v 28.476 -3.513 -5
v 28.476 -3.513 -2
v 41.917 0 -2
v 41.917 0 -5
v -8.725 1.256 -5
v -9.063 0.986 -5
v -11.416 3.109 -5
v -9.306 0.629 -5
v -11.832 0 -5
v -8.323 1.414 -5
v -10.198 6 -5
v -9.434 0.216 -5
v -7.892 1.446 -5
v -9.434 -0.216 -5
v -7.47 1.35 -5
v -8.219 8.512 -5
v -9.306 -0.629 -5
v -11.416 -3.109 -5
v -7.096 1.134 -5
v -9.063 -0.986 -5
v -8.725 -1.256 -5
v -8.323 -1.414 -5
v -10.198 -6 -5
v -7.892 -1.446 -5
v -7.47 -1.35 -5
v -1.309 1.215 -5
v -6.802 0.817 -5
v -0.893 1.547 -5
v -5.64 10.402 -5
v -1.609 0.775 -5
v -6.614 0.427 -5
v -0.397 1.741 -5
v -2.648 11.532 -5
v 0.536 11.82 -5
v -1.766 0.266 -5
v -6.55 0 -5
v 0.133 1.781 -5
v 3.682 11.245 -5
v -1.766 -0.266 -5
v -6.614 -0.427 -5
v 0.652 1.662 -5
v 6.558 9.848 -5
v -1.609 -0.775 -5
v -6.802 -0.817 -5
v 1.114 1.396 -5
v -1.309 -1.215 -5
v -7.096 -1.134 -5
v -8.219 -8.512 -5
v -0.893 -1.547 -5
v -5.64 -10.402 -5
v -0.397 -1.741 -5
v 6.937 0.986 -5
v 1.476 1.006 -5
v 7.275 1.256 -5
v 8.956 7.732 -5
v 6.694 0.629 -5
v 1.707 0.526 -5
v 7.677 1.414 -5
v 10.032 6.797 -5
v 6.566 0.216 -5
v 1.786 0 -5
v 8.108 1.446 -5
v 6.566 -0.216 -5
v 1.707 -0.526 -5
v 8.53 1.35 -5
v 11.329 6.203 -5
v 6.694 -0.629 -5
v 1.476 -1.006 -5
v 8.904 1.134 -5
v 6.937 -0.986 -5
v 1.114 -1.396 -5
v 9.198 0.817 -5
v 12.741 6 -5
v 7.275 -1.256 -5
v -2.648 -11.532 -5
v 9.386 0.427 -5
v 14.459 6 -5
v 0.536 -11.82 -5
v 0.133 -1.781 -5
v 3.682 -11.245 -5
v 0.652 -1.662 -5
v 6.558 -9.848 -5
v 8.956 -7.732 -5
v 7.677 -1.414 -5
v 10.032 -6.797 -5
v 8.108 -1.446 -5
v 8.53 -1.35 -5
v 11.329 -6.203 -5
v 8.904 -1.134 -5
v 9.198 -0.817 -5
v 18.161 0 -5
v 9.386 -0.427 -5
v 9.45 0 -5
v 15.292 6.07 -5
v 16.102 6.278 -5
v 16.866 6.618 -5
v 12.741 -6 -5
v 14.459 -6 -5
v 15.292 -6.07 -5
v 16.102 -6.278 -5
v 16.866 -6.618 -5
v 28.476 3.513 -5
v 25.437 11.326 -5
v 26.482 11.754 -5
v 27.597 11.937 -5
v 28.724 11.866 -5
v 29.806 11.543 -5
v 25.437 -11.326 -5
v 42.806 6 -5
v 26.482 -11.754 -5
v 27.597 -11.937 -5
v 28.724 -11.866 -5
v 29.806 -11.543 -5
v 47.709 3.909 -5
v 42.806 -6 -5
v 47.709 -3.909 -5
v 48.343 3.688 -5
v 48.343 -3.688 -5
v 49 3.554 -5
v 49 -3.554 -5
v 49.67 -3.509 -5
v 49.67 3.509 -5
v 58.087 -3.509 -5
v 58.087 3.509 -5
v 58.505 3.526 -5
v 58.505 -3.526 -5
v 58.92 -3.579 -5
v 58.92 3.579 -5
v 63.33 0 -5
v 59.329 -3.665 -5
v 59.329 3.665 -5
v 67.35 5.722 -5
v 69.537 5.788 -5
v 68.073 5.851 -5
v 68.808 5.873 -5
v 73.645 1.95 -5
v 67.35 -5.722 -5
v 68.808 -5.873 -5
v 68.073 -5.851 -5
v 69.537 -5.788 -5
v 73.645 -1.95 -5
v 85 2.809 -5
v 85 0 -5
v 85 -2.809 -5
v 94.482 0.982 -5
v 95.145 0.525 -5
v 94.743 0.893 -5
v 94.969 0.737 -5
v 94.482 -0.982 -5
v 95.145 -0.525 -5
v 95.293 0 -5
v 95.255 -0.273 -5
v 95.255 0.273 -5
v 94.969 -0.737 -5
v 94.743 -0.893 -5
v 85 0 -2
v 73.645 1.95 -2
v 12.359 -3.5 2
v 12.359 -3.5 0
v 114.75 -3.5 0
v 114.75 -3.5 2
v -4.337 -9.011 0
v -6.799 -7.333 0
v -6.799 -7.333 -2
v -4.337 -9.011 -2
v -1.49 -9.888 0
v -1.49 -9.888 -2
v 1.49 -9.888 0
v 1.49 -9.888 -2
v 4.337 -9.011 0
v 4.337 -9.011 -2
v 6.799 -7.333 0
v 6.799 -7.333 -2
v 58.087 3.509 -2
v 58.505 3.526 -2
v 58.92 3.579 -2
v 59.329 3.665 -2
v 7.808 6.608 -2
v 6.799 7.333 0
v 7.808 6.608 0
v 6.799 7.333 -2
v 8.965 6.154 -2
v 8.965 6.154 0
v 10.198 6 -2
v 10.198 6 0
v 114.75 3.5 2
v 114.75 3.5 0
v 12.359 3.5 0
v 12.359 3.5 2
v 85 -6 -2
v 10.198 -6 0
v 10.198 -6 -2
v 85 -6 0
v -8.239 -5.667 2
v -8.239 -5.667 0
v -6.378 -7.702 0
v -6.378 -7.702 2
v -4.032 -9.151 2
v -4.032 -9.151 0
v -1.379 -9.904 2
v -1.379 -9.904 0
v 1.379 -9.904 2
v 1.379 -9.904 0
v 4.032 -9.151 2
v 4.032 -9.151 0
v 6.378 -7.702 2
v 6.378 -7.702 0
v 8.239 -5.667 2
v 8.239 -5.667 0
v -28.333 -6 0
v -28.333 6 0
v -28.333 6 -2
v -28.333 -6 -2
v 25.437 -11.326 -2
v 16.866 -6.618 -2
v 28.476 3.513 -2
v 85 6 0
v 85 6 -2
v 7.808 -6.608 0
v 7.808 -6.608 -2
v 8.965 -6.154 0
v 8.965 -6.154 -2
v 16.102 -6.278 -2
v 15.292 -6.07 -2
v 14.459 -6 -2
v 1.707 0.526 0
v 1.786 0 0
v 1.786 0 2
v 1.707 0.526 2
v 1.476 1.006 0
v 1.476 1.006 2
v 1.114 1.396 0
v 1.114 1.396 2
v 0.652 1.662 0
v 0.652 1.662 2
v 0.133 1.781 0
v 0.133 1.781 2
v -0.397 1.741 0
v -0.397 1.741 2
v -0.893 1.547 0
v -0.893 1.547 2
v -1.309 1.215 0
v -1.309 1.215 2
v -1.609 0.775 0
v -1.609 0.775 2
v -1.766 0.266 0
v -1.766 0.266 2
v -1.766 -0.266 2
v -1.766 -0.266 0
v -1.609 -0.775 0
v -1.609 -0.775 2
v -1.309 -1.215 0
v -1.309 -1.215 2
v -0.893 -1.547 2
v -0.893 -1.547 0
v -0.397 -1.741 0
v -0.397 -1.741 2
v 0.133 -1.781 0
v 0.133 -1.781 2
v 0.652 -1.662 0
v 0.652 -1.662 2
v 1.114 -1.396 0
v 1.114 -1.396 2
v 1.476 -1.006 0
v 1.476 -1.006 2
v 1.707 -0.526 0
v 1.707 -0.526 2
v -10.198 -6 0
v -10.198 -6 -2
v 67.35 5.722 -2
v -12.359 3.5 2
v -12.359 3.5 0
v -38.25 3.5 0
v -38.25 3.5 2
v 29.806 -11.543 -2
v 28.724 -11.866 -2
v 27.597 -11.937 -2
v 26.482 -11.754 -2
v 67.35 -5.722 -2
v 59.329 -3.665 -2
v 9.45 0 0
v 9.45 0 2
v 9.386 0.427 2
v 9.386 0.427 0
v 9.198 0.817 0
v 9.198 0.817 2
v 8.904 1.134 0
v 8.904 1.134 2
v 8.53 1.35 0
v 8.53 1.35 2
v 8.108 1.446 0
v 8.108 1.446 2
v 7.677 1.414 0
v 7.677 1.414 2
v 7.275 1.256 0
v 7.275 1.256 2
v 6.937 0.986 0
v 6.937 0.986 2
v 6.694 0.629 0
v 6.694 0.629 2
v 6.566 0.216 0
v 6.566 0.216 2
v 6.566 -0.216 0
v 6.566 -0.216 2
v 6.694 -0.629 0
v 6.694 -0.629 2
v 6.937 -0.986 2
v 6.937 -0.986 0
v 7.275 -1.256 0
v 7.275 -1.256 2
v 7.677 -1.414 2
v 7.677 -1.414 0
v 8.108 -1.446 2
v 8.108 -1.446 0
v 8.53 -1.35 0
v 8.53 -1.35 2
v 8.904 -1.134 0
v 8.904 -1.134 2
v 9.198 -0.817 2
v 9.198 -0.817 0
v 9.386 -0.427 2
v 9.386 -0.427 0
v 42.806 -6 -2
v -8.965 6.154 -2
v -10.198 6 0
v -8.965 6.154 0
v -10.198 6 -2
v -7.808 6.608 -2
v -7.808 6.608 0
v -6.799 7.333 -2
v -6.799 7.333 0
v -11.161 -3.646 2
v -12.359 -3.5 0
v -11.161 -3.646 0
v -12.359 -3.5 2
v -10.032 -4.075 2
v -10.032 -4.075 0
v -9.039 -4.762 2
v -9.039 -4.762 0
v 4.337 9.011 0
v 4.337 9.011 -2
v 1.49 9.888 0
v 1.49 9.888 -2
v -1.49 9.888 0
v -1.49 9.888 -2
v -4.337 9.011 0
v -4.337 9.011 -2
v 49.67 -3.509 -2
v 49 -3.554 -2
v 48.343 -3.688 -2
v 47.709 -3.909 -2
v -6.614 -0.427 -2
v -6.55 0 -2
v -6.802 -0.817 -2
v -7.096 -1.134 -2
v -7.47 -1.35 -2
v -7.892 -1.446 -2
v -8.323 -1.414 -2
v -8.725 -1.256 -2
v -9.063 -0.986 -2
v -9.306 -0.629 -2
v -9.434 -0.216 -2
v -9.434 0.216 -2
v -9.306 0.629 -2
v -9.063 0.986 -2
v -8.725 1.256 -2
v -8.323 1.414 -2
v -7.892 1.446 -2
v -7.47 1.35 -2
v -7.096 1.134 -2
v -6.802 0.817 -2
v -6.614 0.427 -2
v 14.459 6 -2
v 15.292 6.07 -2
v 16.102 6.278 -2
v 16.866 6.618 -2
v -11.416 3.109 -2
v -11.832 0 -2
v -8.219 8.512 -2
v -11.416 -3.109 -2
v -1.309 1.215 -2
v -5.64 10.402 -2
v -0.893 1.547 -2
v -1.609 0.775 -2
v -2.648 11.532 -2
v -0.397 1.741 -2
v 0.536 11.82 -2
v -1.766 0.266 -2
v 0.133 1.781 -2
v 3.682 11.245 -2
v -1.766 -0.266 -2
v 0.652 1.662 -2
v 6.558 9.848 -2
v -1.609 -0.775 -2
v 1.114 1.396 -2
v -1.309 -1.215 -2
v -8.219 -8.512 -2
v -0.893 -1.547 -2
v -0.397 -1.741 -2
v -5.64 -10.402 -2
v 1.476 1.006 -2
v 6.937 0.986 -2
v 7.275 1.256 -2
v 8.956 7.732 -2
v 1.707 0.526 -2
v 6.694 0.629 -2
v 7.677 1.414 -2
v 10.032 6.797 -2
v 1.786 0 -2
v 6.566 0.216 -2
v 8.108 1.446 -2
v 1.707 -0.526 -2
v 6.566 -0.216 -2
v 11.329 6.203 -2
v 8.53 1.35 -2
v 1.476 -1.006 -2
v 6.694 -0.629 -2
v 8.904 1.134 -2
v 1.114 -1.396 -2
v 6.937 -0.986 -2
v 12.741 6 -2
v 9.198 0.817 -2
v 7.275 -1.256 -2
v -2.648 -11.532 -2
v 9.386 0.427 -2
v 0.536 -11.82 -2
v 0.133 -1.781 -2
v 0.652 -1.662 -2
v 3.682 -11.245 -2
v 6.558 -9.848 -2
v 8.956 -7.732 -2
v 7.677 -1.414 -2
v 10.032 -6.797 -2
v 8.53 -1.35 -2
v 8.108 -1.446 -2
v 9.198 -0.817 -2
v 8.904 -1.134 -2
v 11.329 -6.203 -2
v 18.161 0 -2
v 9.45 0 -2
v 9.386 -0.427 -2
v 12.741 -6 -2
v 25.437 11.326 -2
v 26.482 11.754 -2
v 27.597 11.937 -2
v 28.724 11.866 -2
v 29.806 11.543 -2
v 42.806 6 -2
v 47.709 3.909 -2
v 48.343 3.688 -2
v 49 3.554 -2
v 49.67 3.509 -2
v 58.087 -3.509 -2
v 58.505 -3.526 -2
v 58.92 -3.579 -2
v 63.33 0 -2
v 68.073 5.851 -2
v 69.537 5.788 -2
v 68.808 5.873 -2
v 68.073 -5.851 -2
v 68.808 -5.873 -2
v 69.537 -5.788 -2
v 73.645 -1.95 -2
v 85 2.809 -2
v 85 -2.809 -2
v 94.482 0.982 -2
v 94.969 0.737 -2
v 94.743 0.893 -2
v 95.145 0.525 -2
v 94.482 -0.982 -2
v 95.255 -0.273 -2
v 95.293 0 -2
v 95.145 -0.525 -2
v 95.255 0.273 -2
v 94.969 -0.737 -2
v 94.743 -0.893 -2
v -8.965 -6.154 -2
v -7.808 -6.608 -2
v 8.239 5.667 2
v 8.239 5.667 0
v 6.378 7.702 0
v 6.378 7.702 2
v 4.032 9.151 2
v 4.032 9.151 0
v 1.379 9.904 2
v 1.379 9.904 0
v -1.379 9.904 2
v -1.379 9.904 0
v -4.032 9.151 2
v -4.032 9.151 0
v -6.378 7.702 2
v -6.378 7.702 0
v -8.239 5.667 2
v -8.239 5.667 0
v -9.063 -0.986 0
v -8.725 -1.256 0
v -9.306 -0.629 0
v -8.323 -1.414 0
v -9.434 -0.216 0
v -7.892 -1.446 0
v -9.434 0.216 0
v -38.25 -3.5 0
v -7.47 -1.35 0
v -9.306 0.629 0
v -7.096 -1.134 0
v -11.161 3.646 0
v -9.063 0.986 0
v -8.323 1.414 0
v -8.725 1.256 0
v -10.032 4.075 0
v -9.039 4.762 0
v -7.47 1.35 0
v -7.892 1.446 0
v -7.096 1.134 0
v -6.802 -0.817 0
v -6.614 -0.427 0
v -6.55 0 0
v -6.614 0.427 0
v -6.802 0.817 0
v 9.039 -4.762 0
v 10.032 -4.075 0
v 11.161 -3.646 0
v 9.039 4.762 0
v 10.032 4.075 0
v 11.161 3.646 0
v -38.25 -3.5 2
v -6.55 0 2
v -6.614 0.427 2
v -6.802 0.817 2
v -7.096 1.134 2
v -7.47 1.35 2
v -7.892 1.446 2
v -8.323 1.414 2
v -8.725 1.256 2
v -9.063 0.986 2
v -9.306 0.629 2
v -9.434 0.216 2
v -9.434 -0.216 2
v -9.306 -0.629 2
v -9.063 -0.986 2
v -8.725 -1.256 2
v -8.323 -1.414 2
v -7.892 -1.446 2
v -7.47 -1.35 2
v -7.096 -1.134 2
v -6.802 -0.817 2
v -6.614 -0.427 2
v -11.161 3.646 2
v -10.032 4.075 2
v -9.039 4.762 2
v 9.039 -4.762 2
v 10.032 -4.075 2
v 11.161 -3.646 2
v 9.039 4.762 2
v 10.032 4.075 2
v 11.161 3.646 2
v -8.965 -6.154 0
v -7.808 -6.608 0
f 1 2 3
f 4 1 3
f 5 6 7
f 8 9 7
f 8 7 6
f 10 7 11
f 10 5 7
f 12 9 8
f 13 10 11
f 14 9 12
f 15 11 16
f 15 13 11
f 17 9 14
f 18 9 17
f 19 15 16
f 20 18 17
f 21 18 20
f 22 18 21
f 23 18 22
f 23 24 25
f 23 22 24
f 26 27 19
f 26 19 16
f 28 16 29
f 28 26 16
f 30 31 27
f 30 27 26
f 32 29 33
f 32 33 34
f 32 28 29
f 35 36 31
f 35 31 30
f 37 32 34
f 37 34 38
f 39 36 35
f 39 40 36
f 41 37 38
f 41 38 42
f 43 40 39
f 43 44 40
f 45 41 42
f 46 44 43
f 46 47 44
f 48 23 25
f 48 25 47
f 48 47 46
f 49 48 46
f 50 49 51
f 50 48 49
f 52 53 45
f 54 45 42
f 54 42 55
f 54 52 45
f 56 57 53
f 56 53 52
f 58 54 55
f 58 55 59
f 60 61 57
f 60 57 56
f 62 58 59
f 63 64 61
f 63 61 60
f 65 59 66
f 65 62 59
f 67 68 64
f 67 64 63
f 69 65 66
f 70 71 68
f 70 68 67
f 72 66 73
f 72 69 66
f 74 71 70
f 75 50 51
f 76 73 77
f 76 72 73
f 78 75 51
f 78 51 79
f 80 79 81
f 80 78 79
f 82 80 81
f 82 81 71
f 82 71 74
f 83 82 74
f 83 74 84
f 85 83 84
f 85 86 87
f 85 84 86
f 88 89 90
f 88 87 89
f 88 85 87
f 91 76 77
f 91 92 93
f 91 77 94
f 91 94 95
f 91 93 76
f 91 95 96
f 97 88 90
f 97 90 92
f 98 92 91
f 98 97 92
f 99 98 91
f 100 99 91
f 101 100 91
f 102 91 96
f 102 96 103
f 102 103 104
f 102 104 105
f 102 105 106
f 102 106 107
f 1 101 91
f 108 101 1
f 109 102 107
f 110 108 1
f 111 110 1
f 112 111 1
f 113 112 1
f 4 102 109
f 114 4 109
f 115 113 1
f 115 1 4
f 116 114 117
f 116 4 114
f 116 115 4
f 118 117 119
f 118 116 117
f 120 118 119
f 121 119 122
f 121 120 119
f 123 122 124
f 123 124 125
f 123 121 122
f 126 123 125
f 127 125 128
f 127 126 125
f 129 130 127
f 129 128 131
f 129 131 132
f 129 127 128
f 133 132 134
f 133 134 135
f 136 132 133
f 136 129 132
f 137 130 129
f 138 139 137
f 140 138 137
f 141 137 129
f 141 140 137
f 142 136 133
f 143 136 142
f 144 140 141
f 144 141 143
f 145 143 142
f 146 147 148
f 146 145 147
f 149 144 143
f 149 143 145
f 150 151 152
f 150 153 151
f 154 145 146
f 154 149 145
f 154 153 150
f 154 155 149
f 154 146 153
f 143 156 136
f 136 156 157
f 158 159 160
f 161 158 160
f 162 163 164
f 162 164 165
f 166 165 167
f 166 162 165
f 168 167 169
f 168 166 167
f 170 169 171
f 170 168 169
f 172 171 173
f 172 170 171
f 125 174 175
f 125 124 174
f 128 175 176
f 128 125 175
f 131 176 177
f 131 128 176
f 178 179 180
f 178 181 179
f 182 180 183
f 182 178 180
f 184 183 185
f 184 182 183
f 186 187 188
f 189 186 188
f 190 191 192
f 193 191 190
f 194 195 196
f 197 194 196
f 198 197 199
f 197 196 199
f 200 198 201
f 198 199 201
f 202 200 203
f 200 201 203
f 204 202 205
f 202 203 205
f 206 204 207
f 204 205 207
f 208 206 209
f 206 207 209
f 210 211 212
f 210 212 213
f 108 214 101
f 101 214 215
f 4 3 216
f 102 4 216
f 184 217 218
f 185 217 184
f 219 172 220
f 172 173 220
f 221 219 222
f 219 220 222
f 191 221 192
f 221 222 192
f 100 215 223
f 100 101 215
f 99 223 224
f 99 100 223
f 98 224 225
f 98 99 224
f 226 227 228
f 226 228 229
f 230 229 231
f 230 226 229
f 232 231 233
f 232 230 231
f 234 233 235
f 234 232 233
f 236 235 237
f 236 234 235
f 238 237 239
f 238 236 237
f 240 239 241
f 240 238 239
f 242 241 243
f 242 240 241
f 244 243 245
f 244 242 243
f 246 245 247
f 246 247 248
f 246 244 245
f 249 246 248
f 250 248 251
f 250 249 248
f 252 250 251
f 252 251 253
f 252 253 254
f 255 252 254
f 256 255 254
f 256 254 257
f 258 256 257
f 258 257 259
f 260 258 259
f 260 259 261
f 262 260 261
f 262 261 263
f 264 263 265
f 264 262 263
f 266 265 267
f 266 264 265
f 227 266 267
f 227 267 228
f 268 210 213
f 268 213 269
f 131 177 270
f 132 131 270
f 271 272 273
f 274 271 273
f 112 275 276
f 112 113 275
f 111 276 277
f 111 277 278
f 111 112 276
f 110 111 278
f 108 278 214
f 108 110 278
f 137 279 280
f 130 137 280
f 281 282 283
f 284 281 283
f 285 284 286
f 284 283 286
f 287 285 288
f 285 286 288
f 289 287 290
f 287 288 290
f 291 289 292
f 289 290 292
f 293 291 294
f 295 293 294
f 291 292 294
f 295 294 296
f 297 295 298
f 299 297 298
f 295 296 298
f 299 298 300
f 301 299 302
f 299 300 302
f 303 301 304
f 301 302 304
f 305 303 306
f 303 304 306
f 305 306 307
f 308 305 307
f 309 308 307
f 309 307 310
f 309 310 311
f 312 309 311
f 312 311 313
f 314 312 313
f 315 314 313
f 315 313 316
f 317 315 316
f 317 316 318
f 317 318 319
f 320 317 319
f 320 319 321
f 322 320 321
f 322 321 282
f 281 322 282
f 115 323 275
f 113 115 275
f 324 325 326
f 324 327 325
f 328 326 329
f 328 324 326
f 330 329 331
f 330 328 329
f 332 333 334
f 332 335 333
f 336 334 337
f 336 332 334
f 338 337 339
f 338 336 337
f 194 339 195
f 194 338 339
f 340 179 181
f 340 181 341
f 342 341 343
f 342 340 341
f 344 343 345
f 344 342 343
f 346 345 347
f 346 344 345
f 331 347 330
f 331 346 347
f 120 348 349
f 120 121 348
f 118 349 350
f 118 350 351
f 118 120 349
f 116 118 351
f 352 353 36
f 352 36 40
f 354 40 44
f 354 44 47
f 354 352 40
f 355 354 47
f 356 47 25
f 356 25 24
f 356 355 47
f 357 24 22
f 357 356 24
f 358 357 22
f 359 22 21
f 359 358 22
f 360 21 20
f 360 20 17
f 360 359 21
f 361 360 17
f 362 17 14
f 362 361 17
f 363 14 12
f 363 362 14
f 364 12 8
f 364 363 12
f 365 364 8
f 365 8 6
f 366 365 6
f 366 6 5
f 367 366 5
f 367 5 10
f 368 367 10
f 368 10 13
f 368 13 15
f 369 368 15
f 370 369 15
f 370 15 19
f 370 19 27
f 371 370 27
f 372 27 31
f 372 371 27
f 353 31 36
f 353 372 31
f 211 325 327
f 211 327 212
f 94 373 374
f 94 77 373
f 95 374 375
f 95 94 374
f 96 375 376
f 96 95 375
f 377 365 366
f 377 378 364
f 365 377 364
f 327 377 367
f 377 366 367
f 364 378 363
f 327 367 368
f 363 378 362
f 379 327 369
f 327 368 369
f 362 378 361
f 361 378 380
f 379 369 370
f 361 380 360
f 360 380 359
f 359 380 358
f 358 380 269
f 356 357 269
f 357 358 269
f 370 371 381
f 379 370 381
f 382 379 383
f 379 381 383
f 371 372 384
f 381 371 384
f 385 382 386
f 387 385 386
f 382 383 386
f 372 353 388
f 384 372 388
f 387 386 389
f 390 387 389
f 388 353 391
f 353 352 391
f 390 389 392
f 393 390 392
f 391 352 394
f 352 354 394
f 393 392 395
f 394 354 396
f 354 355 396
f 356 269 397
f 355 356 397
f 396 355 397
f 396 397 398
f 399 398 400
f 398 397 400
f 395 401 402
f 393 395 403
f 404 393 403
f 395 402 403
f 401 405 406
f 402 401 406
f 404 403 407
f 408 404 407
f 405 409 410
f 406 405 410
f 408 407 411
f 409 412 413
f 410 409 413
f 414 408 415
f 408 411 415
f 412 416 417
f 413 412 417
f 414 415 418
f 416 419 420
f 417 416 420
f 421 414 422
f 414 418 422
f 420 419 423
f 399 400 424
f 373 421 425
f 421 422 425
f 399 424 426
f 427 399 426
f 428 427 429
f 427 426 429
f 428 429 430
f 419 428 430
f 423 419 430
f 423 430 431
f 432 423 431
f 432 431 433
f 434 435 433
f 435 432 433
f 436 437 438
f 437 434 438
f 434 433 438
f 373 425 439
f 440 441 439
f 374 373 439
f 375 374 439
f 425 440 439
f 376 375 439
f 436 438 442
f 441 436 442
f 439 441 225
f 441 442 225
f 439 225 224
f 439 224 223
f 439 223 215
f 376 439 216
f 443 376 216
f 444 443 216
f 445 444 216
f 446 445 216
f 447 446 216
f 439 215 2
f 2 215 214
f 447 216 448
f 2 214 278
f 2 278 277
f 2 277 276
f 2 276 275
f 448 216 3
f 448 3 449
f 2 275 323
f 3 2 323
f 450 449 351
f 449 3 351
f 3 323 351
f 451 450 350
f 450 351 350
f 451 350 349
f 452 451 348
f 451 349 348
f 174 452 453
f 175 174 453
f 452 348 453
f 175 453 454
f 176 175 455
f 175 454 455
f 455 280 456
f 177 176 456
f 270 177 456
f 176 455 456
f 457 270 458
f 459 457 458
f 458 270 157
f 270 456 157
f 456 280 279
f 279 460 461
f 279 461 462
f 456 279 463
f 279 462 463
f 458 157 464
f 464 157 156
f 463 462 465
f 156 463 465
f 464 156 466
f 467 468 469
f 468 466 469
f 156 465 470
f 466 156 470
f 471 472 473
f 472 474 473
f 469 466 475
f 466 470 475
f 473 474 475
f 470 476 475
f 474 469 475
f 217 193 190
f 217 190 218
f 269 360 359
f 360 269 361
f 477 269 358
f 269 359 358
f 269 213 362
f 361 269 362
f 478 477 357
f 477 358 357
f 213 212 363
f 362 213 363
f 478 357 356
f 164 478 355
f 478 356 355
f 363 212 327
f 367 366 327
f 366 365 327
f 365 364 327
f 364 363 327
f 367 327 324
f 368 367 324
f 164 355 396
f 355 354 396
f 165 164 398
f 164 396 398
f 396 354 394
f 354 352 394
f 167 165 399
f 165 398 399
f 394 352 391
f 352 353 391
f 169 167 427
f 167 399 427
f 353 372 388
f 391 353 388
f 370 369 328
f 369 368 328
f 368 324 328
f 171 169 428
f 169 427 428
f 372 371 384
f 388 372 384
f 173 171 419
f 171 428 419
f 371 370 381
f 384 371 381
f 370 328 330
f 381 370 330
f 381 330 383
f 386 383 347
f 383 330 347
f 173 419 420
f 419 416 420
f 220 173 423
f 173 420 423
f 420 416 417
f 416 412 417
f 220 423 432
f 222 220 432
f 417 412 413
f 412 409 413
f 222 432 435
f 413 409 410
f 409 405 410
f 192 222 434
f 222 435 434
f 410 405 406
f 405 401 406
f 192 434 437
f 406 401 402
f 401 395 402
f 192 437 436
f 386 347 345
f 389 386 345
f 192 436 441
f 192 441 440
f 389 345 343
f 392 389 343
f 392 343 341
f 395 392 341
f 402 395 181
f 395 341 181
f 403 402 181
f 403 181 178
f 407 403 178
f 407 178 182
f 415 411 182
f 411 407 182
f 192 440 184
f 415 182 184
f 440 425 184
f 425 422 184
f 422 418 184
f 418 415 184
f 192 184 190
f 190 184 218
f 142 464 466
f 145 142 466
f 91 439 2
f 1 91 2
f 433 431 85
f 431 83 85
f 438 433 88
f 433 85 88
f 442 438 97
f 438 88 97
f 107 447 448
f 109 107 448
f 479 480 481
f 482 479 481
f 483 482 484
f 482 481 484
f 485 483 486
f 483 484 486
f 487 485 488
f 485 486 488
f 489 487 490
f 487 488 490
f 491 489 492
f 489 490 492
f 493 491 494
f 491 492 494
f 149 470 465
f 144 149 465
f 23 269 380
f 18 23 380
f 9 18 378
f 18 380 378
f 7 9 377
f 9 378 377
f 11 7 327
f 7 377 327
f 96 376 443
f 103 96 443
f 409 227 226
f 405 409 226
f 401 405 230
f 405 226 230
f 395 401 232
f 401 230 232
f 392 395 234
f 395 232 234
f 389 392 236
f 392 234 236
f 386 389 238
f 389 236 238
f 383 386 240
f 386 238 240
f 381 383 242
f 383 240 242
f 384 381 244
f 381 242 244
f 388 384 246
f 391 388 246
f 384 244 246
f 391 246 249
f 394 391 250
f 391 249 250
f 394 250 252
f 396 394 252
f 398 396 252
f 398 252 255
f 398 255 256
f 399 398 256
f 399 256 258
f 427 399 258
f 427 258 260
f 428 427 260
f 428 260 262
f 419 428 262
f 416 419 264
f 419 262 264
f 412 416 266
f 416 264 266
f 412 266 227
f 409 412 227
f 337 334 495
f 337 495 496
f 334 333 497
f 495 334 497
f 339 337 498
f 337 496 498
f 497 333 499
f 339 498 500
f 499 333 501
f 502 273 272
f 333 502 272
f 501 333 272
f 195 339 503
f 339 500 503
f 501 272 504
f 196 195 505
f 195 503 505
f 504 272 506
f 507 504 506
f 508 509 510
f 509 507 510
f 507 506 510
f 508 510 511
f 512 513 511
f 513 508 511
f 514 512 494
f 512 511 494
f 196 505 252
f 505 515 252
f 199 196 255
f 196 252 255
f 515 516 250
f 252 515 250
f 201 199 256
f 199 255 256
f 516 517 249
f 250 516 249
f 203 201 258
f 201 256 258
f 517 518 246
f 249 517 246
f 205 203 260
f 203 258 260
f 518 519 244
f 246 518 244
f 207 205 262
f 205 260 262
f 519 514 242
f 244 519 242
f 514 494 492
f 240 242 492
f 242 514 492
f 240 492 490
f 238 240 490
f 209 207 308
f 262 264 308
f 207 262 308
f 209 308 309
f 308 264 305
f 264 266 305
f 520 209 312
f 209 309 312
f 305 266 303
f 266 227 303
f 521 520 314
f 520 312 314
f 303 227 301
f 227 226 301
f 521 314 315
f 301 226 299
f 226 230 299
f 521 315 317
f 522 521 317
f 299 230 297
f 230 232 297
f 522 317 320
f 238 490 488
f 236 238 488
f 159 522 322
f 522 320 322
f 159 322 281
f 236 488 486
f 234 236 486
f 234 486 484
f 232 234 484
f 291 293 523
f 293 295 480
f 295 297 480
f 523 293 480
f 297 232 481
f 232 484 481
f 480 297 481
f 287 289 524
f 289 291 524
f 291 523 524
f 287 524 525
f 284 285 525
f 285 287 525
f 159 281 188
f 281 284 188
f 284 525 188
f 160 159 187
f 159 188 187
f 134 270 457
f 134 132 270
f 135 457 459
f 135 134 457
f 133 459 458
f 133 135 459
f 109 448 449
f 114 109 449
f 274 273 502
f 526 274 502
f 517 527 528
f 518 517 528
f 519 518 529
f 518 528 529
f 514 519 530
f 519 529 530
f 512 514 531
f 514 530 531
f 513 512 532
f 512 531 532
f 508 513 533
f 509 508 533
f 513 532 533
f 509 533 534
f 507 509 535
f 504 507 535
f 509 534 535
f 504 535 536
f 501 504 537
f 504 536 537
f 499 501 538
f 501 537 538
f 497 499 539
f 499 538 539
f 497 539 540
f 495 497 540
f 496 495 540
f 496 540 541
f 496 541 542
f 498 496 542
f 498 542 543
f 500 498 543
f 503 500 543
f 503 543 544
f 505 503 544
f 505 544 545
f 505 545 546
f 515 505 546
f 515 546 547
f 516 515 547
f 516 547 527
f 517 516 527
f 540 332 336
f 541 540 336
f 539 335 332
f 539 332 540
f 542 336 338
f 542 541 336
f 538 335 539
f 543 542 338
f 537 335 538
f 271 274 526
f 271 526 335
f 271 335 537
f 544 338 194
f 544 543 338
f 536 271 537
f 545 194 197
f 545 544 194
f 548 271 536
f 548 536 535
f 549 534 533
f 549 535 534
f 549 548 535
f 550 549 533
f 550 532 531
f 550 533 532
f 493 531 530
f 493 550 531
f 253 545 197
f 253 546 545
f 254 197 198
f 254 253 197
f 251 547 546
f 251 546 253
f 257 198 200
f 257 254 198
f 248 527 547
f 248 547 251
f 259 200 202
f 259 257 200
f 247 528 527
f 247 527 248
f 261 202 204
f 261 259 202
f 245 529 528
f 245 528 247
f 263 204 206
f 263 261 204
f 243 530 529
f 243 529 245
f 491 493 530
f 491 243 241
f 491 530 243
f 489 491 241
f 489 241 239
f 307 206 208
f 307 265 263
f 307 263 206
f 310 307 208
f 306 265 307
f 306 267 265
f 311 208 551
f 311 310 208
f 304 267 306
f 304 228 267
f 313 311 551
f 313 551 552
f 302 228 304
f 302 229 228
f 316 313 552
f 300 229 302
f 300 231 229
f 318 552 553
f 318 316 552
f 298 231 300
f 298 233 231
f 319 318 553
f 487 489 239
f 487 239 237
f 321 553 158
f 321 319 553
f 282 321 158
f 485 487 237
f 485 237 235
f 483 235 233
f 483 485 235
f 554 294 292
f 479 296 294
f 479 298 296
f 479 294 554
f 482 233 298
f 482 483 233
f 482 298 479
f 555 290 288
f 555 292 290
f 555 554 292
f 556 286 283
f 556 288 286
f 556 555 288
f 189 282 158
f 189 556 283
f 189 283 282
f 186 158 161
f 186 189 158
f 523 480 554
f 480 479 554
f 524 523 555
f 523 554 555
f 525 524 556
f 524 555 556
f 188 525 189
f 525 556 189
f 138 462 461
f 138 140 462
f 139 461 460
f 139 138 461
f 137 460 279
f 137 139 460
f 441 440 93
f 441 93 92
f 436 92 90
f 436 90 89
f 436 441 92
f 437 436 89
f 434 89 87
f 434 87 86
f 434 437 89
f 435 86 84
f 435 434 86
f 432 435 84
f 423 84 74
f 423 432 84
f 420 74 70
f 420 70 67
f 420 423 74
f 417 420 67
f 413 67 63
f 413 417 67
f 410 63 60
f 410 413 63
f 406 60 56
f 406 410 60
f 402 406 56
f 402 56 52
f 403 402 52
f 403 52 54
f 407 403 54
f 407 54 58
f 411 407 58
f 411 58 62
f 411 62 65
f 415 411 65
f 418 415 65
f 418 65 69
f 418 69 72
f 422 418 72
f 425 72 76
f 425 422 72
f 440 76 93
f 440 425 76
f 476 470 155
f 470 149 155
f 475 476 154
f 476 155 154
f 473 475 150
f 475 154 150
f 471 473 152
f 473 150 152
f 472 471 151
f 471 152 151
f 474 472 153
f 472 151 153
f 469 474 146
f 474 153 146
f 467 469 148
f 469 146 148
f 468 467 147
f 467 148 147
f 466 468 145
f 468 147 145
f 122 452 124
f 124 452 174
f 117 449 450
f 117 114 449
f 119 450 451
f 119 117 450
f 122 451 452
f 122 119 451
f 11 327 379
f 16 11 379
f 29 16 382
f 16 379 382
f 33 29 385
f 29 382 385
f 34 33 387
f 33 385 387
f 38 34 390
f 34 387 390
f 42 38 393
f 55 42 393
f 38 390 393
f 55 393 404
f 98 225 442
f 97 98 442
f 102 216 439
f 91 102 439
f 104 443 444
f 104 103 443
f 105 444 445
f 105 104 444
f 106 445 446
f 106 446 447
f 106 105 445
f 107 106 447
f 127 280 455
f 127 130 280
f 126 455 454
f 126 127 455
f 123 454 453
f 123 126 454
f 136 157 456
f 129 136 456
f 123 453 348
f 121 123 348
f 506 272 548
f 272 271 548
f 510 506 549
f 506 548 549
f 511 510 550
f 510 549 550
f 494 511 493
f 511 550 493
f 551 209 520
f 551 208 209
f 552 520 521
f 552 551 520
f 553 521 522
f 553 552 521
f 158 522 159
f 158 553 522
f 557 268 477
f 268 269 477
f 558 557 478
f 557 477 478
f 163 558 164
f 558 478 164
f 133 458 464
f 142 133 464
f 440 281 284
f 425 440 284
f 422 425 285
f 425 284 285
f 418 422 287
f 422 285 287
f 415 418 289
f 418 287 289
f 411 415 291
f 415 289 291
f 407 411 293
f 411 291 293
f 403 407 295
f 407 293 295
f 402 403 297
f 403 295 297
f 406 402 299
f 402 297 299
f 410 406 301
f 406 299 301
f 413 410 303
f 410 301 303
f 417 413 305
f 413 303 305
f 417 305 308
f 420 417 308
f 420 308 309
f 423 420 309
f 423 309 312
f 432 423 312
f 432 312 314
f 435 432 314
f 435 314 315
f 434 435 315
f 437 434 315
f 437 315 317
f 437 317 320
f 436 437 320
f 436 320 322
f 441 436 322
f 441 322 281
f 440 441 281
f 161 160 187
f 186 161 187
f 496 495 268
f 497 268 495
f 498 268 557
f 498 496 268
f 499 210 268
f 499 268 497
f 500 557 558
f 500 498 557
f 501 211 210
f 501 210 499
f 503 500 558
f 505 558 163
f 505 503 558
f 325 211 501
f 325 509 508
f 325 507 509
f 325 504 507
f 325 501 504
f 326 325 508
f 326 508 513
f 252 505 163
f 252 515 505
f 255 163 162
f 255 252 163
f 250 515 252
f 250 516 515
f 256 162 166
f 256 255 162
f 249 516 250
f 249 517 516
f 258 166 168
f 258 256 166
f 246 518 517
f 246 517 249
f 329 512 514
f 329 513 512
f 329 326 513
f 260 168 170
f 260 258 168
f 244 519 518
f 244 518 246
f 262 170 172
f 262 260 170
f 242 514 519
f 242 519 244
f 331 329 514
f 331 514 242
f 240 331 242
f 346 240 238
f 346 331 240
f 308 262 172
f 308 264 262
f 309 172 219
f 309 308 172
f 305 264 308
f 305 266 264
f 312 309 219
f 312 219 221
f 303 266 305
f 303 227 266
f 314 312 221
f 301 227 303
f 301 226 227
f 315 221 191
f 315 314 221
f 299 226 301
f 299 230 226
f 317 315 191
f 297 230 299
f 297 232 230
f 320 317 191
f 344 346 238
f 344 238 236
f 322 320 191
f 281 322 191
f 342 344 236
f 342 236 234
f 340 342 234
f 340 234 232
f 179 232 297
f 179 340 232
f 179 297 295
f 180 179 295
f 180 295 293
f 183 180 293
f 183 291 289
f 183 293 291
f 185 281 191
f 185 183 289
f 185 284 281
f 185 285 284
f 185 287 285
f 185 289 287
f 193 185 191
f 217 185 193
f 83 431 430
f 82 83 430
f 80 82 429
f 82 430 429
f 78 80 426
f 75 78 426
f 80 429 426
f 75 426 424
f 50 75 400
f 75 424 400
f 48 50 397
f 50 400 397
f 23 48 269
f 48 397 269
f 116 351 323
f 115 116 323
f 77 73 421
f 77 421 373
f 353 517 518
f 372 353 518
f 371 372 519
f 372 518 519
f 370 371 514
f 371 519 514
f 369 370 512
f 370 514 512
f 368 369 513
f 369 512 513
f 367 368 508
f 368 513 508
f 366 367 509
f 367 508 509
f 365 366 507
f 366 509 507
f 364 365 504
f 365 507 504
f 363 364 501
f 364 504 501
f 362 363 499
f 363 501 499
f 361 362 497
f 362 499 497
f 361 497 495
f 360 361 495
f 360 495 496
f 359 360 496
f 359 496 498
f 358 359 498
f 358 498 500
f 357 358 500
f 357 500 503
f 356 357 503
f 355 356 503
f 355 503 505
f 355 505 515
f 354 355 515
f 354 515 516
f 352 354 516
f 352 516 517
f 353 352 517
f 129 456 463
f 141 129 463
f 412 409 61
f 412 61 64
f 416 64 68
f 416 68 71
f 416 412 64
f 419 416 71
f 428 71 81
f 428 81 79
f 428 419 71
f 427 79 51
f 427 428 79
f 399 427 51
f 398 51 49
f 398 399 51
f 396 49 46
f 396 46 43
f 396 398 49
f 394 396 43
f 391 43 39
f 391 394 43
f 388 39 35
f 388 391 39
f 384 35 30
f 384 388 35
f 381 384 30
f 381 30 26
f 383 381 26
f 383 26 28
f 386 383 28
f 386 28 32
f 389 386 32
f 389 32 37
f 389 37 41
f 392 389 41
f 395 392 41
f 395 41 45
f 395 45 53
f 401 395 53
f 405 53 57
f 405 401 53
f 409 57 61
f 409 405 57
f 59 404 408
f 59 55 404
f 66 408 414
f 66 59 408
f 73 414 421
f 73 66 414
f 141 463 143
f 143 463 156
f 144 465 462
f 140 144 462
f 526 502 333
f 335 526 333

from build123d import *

# Parameters (mm, degrees)
F0_R     = 1.7859375
F1_DEPTH = 2
F2_R     = 1.7859375
F3_DEPTH = 2
F4_R     = 1.45
F5_DEPTH = 25
F6_R     = 5
F6_2_R   = 5
F7_R     = 1.45
F7_R_2   = 1.7859375
F8_DEPTH = 3
F9_R     = 5
F10_R    = 1


with BuildPart() as f1:
    # F0 (on Top) → F1 (new body)
    with BuildSketch(Plane.XY):
        with BuildLine():
            Line((-9.3674969976, 3.5), (-38.25, 3.5))
            Line((-38.25, 3.5), (-38.25, -3.5))
            Line((-38.25, -3.5), (-9.3674969976, -3.5))
            ThreePointArc((-9.3674969976, -3.5), (-10, 0), (-9.3674969976, 3.5))
        make_face()
        with BuildLine():
            ThreePointArc((9.3674969976, 3.5), (0, 10), (-9.3674969976, 3.5))
            Line((-9.3674969976, 3.5), (9.3674969976, 3.5))
        make_face()
        with BuildLine():
            Line((9.3674969976, 3.5), (-9.3674969976, 3.5))
            ThreePointArc((-9.3674969976, 3.5), (-10, 0), (-9.3674969976, -3.5))
            Line((-9.3674969976, -3.5), (9.3674969976, -3.5))
            ThreePointArc((9.3674969976, -3.5), (9.8406038935, -1.7783461452), (10, 0))
            ThreePointArc((10, 0), (9.8406038935, 1.7783461452), (9.3674969976, 3.5))
        make_face()
        Circle(F0_R, mode=Mode.SUBTRACT)
        with BuildLine():
            Line((114.75, 3.5), (9.3674969976, 3.5))
            ThreePointArc((9.3674969976, 3.5), (9.8406038935, 1.7783461452), (10, 0))
            ThreePointArc((10, 0), (9.8406038935, -1.7783461452), (9.3674969976, -3.5))
            Line((9.3674969976, -3.5), (114.75, -3.5))
            Line((114.75, -3.5), (114.75, 3.5))
        make_face()
        with BuildLine():
            Line((9.3674969976, -3.5), (-9.3674969976, -3.5))
            ThreePointArc((-9.3674969976, -3.5), (0, -10), (9.3674969976, -3.5))
        make_face()
    extrude(amount=F1_DEPTH)


with BuildPart() as f3:
    # F2 (on Top) → F3 (new body)
    with BuildSketch(Plane.XY):
        with BuildLine():
            Line((-8, 6), (-28.3333333333, 6))
            Line((-28.3333333333, 6), (-28.3333333333, -6))
            Line((-28.3333333333, -6), (-8, -6))
            ThreePointArc((-8, -6), (-10, 0), (-8, 6))
        make_face()
        with BuildLine():
            ThreePointArc((8, 6), (0, 10), (-8, 6))
            Line((-8, 6), (8, 6))
        make_face()
        with BuildLine():
            Line((8, 6), (-8, 6))
            ThreePointArc((-8, 6), (-10, 0), (-8, -6))
            Line((-8, -6), (8, -6))
            ThreePointArc((8, -6), (9.4868329805, -3.1622776602), (10, 0))
            ThreePointArc((10, 0), (9.4868329805, 3.1622776602), (8, 6))
        make_face()
        Circle(F2_R, mode=Mode.SUBTRACT)
        with BuildLine():
            Line((85, 6), (8, 6))
            ThreePointArc((8, 6), (9.4868329805, 3.1622776602), (10, 0))
            ThreePointArc((10, 0), (9.4868329805, -3.1622776602), (8, -6))
            Line((8, -6), (85, -6))
            Line((85, -6), (85, 6))
        make_face()
        with BuildLine():
            Line((8, -6), (-8, -6))
            ThreePointArc((-8, -6), (0, -10), (8, -6))
        make_face()
    extrude(amount=-F3_DEPTH)


with BuildPart() as f5_tool:
    # F4 (on face) → F5 (new body)
    with BuildSketch(Plane.XY.offset(2)):
        with Locations((8, 0)):
            Circle(F4_R)
        with Locations((-8, 0)):
            Circle(F4_R)
    extrude(amount=-F5_DEPTH)


with BuildPart() as f1_1:
    add(f1.part)

    # F5: cut by f5_tool
    add(f5_tool.part, mode=Mode.SUBTRACT)

    # F6
    f6_edges = [f1_1.edges().sort_by_distance(p)[0] for p in [
        (9.367497, -3.5, 1),
        (9.367497, 3.5, 1),
        (-9.367497, 3.5, 1),
        (-9.367497, -3.5, 1),
    ]]
    fillet(f6_edges, radius=F6_R)


with BuildPart() as f3_1:
    add(f3.part)

    # F5: cut by f5_tool
    add(f5_tool.part, mode=Mode.SUBTRACT)

    # F6#2
    f6_2_edges = [f3_1.edges().sort_by_distance(p)[0] for p in [
        (-8, -6, -1),
        (8, 6, -1),
        (8, -6, -1),
        (-8, 6, -1),
    ]]
    fillet(f6_2_edges, radius=F6_2_R)


with BuildPart() as f8:
    # F7 (on face) → F8 (new body)
    with BuildSketch(Plane(origin=(0, 0, -2), x_dir=(1, 0, 0), z_dir=(0, 0, -1))):
        with BuildLine():
            ThreePointArc((6.7986926848, 7.3333333333), (8.3722971688, 6.3452533187), (10.1980390272, 6))
            ThreePointArc((10.1980390272, 6), (0, 11.8321595662), (-10.1980390272, 6))
            ThreePointArc((-10.1980390272, 6), (-8.3722971688, 6.3452533187), (-6.7986926848, 7.3333333333))
            ThreePointArc((-6.7986926848, 7.3333333333), (0, 10), (6.7986926848, 7.3333333333))
        make_face()
        with BuildLine():
            ThreePointArc((-10.1980390272, -6), (0, -11.8321595662), (10.1980390272, -6))
            ThreePointArc((10.1980390272, -6), (8.3722971688, -6.3452533187), (6.7986926848, -7.3333333333))
            ThreePointArc((6.7986926848, -7.3333333333), (0, -10), (-6.7986926848, -7.3333333333))
            ThreePointArc((-6.7986926848, -7.3333333333), (-8.3722971688, -6.3452533187), (-10.1980390272, -6))
        make_face()
        with BuildLine():
            Line((-10.1980390272, -6), (-10.1980390272, 6))
            ThreePointArc((-10.1980390272, 6), (-11.8321595662, 0), (-10.1980390272, -6))
        make_face()
        with BuildLine():
            ThreePointArc((10.1980390272, -6), (11.4163221975, -3.1092744305), (11.8321595662, 0))
            ThreePointArc((11.8321595662, 0), (11.4163221975, 3.1092744305), (10.1980390272, 6))
            ThreePointArc((10.1980390272, 6), (8.3722971688, 6.3452533187), (6.7986926848, 7.3333333333))
            ThreePointArc((6.7986926848, 7.3333333333), (0, 10), (-6.7986926848, 7.3333333333))
            ThreePointArc((-6.7986926848, 7.3333333333), (-8.3722971688, 6.3452533187), (-10.1980390272, 6))
            Line((-10.1980390272, 6), (-10.1980390272, -6))
            ThreePointArc((-10.1980390272, -6), (-8.3722971688, -6.3452533187), (-6.7986926848, -7.3333333333))
            ThreePointArc((-6.7986926848, -7.3333333333), (0, -10), (6.7986926848, -7.3333333333))
            ThreePointArc((6.7986926848, -7.3333333333), (8.3722971688, -6.3452533187), (10.1980390272, -6))
        make_face()
        with Locations((-8, 0)):
            Circle(F7_R, mode=Mode.SUBTRACT)
        Circle(F7_R_2, mode=Mode.SUBTRACT)
        with Locations((8, 0)):
            Circle(F7_R, mode=Mode.SUBTRACT)
        Polygon((27.5687761605, 12.4966884032), (15.7419797033, 6), (42.8056608912, 6), align=None)
        Polygon((42.8056608912, -6), (15.7419797033, -6), (27.5687761605, -12.4966884032), align=None)
        Polygon((85, 2.8088164049), (85, 0), (85, -2.8088164049), (99.579103291, 0), align=None)
        with BuildLine():
            Line((11.8321595662, 0), (18.1609746069, 0))
            Line((18.1609746069, 0), (28.4762885422, 3.5125622526))
            Line((28.4762885422, 3.5125622526), (41.9174581766, 0))
            Line((41.9174581766, 0), (63.3295476437, 0))
            Line((63.3295476437, 0), (73.6448615789, 1.9496356836))
            Line((73.6448615789, 1.9496356836), (85, 0))
            Line((85, 0), (85, 2.8088164049))
            Line((85, 2.8088164049), (68.4362277389, 6))
            Line((68.4362277389, 6), (58.7179884315, 3.5087410361))
            Line((58.7179884315, 3.5087410361), (48.6484877765, 3.5087410361))
            Line((48.6484877765, 3.5087410361), (42.8056608912, 6))
            Line((42.8056608912, 6), (15.7419797033, 6))
            Line((15.7419797033, 6), (10.1980390272, 6))
            ThreePointArc((10.1980390272, 6), (11.4163221975, 3.1092744305), (11.8321595662, 0))
        make_face()
        with BuildLine():
            Line((28.4762885422, -3.5125622526), (18.1609746069, 0))
            Line((18.1609746069, 0), (11.8321595662, 0))
            ThreePointArc((11.8321595662, 0), (11.4163221975, -3.1092744305), (10.1980390272, -6))
            Line((10.1980390272, -6), (15.7419797033, -6))
            Line((15.7419797033, -6), (42.8056608912, -6))
            Line((42.8056608912, -6), (48.6484877765, -3.5087410361))
            Line((48.6484877765, -3.5087410361), (58.7179884315, -3.5087410361))
            Line((58.7179884315, -3.5087410361), (68.4362277389, -6))
            Line((68.4362277389, -6), (85, -2.8088164049))
            Line((85, -2.8088164049), (85, 0))
            Line((85, 0), (73.6448615789, -1.9496356836))
            Line((73.6448615789, -1.9496356836), (63.3295476437, 0))
            Line((63.3295476437, 0), (41.9174581766, 0))
            Line((41.9174581766, 0), (28.4762885422, -3.5125622526))
        make_face()
    extrude(amount=F8_DEPTH)

    # F9
    f9_edges = [f8.edges().sort_by_distance(p)[0] for p in [
        (10.198039, 6, -3.5),
        (15.74198, 6, -3.5),
        (10.198039, -6, -3.5),
        (15.74198, -6, -3.5),
        (27.568776, -12.496688, -3.5),
        (27.568776, 12.496688, -3.5),
        (48.648488, 3.508741, -3.5),
        (58.717988, 3.508741, -3.5),
        (68.436228, 6, -3.5),
        (48.648488, -3.508741, -3.5),
        (58.717988, -3.508741, -3.5),
        (68.436228, -6, -3.5),
    ]]
    fillet(f9_edges, radius=F9_R)

    # F10
    f10_edges = [f8.edges().sort_by_distance(p)[0] for p in [
        (99.579103, 0, -3.5),
    ]]
    fillet(f10_edges, radius=F10_R)


solid = Compound([f1_1.part, f3_1.part, f8.part])
